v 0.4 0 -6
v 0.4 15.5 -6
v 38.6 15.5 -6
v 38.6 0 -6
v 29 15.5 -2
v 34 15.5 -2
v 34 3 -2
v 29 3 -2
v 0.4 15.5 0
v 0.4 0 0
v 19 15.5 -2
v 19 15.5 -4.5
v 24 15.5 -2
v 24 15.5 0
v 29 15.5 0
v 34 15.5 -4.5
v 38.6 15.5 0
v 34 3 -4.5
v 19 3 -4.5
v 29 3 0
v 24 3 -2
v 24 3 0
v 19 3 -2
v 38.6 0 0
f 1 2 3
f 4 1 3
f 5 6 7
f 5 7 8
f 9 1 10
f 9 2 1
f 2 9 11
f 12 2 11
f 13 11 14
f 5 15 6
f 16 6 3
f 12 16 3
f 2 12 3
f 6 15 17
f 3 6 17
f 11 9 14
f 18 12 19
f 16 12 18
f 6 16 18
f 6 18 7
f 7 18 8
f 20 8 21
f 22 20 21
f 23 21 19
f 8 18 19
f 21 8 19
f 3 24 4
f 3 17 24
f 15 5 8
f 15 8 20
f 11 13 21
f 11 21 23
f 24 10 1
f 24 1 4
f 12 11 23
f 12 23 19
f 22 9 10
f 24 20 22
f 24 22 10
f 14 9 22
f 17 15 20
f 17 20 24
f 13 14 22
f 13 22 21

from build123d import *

# Parameters (mm, degrees)
SKETCH2_W           = 39
SKETCH2_H           = 15.5
BOSS_EXTRUDE1_DEPTH = 6
CUT_EXTRUDE1_DEPTH  = 12.5
SKETCH4_W           = 20.319843286
SKETCH4_H           = 28.236665345
CUT_EXTRUDE2_DEPTH  = 0.4
SKETCH5_W           = 11.083550883
SKETCH5_H           = 22.584934042
CUT_EXTRUDE3_DEPTH  = 0.4


with BuildPart() as part:
    # Sketch2 → Boss-Extrude1 (new body)
    with BuildSketch(Plane.XY):
        with Locations((19.5, 7.75)):
            Rectangle(SKETCH2_W, SKETCH2_H)
    extrude(amount=-BOSS_EXTRUDE1_DEPTH)

    # Sketch3 → Cut-Extrude1 (cut)
    with BuildSketch(Plane(origin=(0, 15.5, 0), x_dir=(1, 0, 0), z_dir=(0, 1, 0))):
        Polygon((24, 0), (24, 2), (19, 2), (19, 4.5), (34, 4.5), (34, 2), (29, 2), (29, 0), align=None)
    extrude(amount=-CUT_EXTRUDE1_DEPTH, mode=Mode.SUBTRACT)

    # Sketch4 → Cut-Extrude2 (cut)
    with BuildSketch(Plane(origin=(39, 0, 0), x_dir=(0, 0, -1), z_dir=(1, 0, 0))):
        with Locations((6.654932851, 5.177032831)):
            Rectangle(SKETCH4_W, SKETCH4_H)
    extrude(amount=-CUT_EXTRUDE2_DEPTH, mode=Mode.SUBTRACT)

    # Sketch5 → Cut-Extrude3 (cut)
    with BuildSketch(Plane.ZY):
        with Locations((-2.571172138, 7.134247173)):
            Rectangle(SKETCH5_W, SKETCH5_H)
    extrude(amount=-CUT_EXTRUDE3_DEPTH, mode=Mode.SUBTRACT)


solid = part.part
